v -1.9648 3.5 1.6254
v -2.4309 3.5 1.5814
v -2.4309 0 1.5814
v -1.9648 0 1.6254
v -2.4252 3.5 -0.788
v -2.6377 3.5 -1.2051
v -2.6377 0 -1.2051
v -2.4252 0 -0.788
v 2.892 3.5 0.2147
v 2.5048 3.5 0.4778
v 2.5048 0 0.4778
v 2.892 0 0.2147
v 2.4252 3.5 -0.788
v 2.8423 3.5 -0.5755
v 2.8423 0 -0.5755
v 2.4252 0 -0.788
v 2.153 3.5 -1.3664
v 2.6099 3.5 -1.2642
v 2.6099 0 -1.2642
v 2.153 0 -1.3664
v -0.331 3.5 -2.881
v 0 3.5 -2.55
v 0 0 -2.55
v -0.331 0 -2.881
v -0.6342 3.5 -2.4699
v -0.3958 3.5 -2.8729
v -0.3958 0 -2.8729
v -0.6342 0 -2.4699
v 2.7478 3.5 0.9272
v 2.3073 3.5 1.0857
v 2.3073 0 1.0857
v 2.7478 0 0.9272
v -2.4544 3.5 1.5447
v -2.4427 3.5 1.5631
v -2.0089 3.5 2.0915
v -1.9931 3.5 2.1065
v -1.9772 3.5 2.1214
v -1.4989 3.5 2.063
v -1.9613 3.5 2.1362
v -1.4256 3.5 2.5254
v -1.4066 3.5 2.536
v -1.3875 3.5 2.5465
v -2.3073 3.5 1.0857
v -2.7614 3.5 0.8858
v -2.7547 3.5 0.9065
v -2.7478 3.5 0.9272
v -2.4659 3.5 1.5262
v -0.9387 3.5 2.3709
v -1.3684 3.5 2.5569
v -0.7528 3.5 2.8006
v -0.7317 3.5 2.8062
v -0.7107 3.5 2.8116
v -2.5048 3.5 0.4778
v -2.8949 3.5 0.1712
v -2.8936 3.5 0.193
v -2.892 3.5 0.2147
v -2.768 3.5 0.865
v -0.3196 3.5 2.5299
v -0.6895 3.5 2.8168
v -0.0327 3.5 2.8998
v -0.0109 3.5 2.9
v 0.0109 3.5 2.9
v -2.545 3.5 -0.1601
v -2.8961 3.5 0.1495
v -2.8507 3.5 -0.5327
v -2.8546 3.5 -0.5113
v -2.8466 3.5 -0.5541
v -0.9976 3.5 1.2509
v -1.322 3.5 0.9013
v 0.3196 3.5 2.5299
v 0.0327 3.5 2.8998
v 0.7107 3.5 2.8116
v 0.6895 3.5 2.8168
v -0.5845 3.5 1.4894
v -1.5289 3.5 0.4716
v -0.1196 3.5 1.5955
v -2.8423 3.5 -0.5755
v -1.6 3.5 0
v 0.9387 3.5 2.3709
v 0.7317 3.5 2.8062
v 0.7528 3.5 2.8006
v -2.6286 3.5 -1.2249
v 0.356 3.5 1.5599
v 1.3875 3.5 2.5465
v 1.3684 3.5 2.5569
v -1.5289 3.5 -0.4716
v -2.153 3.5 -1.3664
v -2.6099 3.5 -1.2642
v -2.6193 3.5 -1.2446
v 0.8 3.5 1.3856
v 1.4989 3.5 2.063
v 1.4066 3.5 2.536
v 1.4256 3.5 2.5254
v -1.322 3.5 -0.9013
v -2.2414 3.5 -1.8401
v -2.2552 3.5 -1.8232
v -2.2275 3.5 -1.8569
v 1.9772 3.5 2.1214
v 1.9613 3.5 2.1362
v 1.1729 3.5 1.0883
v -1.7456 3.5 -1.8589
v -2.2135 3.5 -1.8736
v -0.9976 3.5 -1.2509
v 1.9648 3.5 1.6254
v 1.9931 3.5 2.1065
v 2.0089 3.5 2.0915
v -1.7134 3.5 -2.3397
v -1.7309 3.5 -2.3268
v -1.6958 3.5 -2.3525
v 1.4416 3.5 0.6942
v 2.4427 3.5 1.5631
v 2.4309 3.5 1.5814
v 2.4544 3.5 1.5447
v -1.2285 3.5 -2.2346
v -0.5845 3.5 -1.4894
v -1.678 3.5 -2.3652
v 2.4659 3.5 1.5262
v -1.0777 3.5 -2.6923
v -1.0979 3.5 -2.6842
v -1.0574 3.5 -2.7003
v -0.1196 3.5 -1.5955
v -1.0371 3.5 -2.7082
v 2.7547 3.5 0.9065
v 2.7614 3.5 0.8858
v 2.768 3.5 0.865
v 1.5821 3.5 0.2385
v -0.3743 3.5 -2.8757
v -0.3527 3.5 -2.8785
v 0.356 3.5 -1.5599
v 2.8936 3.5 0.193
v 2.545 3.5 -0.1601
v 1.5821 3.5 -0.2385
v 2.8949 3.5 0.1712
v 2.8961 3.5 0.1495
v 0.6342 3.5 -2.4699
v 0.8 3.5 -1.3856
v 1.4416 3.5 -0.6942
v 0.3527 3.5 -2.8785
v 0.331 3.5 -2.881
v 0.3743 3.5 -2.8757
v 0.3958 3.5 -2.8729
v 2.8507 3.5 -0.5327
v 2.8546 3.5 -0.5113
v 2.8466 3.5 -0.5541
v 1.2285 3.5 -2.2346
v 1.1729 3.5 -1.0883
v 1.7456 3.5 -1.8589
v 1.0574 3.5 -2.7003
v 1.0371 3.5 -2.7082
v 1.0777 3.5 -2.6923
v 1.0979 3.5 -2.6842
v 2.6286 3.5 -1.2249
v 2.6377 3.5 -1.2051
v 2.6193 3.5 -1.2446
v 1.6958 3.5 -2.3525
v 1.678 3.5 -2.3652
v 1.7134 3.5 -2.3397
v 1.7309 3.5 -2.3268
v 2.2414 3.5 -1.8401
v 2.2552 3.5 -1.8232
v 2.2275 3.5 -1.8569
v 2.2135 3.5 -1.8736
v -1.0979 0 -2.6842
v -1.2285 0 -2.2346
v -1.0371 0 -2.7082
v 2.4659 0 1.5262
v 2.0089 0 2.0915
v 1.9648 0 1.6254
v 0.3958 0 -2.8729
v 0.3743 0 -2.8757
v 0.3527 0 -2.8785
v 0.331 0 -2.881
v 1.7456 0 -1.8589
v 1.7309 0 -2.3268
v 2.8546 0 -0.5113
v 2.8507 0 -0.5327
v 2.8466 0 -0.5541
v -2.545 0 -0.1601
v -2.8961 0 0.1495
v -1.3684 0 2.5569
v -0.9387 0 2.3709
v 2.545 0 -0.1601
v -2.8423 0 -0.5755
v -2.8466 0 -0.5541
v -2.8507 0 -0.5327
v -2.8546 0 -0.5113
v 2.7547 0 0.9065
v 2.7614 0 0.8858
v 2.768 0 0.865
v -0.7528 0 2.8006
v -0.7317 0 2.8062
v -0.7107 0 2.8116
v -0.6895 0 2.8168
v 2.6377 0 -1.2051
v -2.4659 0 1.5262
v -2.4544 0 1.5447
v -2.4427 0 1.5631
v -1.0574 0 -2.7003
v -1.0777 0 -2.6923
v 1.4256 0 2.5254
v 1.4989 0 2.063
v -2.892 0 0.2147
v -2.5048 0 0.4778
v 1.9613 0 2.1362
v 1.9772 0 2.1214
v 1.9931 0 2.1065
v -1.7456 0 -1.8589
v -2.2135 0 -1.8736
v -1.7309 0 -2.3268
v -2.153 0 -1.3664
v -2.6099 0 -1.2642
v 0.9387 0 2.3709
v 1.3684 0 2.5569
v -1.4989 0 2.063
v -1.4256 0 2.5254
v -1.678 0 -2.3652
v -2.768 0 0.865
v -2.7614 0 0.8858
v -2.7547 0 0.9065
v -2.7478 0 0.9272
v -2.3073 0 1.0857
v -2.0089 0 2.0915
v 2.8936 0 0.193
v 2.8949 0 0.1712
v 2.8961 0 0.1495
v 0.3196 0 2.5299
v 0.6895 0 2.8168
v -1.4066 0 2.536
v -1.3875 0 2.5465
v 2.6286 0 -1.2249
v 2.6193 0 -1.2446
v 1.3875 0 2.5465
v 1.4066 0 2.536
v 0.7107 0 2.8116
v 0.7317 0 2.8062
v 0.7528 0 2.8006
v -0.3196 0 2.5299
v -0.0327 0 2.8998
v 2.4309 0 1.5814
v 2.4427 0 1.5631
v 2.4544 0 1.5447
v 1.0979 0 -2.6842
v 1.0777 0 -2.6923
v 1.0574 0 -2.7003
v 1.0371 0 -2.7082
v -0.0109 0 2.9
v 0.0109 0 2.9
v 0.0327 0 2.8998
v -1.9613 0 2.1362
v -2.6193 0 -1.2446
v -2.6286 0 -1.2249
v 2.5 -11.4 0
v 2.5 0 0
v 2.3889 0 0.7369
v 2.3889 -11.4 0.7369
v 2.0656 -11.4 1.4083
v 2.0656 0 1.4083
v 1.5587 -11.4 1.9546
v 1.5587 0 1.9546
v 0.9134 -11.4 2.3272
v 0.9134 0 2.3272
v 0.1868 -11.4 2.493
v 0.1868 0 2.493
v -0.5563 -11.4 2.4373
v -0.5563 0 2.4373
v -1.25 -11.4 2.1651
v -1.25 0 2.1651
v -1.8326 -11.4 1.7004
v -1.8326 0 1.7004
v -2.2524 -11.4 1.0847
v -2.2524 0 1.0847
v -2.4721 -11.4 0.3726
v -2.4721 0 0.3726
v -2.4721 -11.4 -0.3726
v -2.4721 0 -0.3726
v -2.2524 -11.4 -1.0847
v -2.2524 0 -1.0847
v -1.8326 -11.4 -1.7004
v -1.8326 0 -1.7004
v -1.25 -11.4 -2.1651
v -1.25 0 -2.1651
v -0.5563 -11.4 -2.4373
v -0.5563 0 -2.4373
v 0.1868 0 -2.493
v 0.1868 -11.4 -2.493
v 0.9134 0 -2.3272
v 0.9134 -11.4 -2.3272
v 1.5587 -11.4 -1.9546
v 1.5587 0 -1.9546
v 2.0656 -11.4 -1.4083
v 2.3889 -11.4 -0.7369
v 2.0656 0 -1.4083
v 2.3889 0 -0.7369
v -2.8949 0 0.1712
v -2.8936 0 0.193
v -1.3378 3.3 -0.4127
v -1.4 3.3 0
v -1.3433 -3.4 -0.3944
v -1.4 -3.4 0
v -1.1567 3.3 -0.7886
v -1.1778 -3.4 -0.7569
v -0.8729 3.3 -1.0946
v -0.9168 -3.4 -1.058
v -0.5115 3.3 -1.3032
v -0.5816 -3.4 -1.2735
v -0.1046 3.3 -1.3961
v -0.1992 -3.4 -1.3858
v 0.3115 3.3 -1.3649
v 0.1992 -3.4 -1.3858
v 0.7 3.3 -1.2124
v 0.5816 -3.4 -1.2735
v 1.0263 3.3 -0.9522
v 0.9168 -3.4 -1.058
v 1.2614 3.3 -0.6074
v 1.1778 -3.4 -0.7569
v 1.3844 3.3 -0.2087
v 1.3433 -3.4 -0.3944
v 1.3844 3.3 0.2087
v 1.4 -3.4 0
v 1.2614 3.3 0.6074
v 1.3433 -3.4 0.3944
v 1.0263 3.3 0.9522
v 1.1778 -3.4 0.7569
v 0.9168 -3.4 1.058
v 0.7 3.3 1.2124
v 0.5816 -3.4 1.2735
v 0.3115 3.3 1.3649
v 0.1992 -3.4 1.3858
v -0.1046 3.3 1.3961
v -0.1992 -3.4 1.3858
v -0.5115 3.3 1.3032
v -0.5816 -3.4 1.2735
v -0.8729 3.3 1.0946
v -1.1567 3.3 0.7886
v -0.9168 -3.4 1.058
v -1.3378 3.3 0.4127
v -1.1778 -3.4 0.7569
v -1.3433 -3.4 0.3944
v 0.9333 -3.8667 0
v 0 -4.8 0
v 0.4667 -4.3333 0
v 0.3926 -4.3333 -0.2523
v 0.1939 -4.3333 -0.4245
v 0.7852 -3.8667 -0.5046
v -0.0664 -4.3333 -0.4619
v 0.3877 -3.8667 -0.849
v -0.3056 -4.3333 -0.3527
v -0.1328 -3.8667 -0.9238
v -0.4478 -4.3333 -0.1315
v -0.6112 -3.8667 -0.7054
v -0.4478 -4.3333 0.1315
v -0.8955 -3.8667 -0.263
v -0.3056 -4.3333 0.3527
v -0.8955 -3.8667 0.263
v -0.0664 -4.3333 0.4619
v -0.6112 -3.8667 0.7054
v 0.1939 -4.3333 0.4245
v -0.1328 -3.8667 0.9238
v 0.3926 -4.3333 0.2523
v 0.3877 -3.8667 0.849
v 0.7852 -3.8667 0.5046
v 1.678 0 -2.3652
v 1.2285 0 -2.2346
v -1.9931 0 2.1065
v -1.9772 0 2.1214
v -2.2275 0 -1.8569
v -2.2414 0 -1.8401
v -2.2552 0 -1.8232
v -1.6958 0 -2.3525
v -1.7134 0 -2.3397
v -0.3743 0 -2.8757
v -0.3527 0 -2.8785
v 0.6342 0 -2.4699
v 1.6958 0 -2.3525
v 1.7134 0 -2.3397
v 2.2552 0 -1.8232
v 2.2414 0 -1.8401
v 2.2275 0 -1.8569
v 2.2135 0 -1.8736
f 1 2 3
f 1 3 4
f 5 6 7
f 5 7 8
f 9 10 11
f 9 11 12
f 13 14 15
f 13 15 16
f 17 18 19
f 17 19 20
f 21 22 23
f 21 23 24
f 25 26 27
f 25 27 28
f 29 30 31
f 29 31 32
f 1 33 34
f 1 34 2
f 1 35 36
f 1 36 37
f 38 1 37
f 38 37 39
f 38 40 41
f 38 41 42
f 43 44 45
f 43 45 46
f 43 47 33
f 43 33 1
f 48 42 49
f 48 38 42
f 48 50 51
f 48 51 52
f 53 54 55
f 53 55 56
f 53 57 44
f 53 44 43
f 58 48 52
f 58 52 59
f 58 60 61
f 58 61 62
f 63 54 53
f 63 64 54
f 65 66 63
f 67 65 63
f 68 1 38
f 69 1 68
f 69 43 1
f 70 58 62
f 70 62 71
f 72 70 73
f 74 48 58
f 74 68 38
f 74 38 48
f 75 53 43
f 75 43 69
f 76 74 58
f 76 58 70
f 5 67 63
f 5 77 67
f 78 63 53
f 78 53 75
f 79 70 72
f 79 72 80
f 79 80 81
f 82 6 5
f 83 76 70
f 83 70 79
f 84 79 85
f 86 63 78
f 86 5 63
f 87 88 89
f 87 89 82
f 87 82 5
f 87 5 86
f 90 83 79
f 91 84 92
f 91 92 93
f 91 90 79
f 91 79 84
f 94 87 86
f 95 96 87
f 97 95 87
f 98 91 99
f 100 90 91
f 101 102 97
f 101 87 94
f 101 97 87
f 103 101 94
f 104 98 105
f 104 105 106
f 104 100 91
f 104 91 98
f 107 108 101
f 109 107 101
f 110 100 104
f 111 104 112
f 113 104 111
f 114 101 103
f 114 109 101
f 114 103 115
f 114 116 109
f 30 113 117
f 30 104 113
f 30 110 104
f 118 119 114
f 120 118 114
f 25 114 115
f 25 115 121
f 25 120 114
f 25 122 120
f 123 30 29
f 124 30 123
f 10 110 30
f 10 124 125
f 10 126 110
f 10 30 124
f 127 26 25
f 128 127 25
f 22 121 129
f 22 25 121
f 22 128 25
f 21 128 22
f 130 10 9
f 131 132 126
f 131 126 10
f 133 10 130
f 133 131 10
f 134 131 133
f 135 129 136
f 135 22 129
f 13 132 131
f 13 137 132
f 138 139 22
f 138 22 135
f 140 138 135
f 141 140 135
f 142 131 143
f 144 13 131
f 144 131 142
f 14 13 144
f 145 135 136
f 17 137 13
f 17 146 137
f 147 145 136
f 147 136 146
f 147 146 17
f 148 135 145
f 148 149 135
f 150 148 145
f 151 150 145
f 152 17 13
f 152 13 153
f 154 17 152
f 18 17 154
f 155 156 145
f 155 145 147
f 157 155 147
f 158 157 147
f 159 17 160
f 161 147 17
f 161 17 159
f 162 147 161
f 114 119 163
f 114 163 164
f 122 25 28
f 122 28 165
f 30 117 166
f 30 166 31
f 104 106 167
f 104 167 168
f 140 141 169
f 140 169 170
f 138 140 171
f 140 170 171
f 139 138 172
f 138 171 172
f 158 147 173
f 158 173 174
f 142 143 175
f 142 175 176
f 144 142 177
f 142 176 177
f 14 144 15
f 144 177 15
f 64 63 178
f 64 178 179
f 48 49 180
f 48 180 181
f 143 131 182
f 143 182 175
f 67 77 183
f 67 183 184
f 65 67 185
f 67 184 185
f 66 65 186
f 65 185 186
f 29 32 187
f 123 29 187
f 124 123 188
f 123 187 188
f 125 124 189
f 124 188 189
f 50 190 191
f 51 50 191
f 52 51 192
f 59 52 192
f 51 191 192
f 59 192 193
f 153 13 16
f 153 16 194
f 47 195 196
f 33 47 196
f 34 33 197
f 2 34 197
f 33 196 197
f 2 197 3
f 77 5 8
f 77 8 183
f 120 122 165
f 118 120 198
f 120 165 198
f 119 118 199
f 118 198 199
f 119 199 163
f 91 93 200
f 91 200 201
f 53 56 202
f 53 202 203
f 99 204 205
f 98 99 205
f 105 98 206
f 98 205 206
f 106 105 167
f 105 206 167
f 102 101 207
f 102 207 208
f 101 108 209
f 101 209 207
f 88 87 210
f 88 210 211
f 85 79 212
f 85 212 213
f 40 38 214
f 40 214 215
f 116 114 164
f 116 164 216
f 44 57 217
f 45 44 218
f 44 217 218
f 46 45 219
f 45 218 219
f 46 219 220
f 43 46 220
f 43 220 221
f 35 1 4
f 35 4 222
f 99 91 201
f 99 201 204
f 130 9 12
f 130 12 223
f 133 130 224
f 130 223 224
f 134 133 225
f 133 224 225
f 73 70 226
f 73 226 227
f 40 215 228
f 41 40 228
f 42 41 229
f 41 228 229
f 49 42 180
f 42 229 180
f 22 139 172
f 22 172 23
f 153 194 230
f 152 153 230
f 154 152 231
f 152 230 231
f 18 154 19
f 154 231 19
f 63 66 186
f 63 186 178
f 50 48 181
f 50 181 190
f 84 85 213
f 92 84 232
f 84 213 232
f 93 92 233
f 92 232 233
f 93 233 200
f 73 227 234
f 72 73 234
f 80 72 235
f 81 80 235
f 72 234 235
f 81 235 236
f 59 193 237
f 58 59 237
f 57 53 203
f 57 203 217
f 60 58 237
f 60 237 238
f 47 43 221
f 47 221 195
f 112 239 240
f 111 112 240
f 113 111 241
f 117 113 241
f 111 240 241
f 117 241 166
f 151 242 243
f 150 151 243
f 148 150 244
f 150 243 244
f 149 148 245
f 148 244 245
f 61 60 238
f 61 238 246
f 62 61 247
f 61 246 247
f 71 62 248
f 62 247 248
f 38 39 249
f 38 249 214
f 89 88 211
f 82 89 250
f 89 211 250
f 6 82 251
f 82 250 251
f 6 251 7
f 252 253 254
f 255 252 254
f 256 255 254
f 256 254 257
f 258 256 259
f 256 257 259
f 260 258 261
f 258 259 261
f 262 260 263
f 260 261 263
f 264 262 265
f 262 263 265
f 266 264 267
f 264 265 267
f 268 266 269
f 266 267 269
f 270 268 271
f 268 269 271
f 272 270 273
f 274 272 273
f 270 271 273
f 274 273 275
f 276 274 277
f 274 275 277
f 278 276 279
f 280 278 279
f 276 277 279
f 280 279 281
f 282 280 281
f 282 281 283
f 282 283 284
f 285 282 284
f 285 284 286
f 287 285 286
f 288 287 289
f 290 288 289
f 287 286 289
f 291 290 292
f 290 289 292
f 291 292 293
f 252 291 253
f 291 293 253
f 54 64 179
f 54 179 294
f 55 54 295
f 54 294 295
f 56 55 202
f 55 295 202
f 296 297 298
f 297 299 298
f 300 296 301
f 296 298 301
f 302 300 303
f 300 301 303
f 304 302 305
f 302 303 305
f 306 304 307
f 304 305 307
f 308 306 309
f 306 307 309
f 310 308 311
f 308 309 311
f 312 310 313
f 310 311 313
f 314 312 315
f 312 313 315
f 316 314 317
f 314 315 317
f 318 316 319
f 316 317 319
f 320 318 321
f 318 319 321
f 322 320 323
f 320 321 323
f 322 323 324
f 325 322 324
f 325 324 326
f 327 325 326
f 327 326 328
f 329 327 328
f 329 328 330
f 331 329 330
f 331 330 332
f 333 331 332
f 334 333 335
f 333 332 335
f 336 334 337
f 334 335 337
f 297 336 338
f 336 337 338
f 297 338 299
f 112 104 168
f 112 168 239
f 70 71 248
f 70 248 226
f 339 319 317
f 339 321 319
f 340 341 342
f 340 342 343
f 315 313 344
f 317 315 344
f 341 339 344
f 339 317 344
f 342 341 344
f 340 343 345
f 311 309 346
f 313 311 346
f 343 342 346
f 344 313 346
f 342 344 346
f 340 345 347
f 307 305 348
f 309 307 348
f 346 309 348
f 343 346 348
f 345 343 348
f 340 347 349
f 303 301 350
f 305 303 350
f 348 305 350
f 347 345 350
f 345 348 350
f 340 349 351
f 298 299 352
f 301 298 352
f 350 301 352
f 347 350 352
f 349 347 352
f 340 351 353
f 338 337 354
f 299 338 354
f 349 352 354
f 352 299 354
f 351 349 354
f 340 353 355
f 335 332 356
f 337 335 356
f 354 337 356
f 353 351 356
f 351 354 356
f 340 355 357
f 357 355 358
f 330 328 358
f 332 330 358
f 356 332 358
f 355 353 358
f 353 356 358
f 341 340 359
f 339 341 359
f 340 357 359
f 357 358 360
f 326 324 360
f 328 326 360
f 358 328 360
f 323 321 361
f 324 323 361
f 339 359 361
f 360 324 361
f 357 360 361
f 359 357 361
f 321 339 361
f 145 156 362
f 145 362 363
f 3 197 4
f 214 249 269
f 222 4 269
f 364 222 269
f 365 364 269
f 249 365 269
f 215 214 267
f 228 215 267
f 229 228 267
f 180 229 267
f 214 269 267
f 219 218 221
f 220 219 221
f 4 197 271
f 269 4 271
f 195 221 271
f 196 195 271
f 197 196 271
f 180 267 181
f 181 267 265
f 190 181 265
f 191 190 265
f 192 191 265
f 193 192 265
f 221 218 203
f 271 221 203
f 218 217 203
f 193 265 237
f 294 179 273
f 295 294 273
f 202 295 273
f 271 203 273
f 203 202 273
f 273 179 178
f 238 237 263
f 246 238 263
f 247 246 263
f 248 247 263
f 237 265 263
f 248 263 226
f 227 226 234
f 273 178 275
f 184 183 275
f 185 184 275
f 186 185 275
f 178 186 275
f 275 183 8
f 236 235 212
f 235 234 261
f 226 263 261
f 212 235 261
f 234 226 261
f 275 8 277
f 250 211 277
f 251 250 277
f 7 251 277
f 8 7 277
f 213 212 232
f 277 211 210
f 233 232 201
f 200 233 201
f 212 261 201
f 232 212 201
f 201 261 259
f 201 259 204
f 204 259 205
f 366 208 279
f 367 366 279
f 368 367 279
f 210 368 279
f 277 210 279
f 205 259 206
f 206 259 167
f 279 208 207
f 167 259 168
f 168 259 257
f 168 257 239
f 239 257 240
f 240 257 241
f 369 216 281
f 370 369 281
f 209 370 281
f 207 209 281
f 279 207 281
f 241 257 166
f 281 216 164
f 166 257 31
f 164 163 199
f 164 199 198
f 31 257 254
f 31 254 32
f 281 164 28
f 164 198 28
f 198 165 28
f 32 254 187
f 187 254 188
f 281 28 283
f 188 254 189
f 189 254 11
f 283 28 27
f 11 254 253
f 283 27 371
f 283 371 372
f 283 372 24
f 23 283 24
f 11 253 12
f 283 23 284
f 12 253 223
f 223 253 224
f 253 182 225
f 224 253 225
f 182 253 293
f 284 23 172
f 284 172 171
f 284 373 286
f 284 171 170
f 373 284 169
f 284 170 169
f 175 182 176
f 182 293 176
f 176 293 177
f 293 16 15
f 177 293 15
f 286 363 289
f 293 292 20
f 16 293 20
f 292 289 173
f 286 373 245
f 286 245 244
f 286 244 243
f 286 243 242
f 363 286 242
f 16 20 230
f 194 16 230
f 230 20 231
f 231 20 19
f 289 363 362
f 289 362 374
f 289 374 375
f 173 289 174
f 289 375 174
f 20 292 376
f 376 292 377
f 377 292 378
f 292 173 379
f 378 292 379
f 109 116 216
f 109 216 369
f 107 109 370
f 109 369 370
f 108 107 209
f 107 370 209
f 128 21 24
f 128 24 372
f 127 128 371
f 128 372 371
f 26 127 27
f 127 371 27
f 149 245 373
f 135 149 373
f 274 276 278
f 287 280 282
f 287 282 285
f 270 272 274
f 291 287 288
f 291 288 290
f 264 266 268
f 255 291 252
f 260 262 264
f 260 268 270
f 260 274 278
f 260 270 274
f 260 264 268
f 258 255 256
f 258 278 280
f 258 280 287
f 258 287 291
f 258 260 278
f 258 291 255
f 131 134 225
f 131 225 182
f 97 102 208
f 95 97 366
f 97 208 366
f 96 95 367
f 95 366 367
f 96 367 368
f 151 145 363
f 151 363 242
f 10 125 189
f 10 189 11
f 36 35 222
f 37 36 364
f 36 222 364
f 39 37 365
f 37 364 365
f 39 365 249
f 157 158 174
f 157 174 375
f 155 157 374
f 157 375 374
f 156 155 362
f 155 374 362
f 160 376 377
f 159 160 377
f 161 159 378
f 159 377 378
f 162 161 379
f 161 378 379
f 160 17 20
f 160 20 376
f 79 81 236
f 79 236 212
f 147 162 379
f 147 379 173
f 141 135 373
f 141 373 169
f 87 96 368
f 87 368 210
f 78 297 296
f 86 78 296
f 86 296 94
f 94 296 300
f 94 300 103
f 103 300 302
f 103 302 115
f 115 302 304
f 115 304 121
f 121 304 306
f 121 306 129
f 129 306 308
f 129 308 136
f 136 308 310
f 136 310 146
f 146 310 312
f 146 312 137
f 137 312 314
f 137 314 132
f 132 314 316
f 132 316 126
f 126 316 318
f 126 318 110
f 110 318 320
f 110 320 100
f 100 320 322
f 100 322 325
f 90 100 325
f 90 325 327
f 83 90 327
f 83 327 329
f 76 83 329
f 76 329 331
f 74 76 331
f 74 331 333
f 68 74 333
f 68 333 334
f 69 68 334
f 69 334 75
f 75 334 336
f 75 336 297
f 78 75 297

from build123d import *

# Parameters (mm, degrees)
SKETCH_1_R                  = 2.9
EXTRUDE_1_DEPTH             = 3.5
SKETCH_2_R                  = 2.5
EXTRUDE_2_DEPTH             = 11.4
CUT_EXTRUDE_1_DEPTH         = 4
HOLE_WIZARD_M32_D           = 2.8
HOLE_WIZARD_M32_DEPTH       = 6.9
HOLE_WIZARD_M32_CSINK_D     = 3.2
HOLE_WIZARD_M32_CSINK_ANGLE = 90
HOLE_WIZARD_M32_TIP         = 1.4


with BuildPart() as part:
    # Эскиз1 → Бобышка-Вытянуть1 (new body)
    with BuildSketch(Plane(origin=(0, 0, 0), x_dir=(1, 0, 0), z_dir=(0, 1, 0))):
        Circle(SKETCH_1_R)
    extrude(amount=EXTRUDE_1_DEPTH)

    # Эскиз2 → Бобышка-Вытянуть2 (add)
    with BuildSketch(Plane.XZ):
        Circle(SKETCH_2_R)
    extrude(amount=EXTRUDE_2_DEPTH)

    # Эскиз3 → Вырез-Вытянуть1 (cut)
    with BuildSketch(Plane(origin=(0, 3.5, 0), x_dir=(1, 0, 0), z_dir=(0, 1, 0))):
        Polygon((0, 2.55), (-0.366495157, 2.916495157), (0.366495157, 2.916495157), align=None)
        Polygon((0.634159212, 2.469887061), (0.370321814, 2.916011738), (1.080283889, 2.733724459), align=None)
        Polygon((1.228471869, 2.234582034), (1.083870103, 2.732304577), (1.726194412, 2.3791838), align=None)
        Polygon((1.74559512, 1.85887), (1.729314848, 2.37691667), (2.263641791, 1.875150272), align=None)
        Polygon((2.15303621, 1.366358327), (2.26610038, 1.872178348), (2.658856231, 1.253294157), align=None)
        Polygon((2.425194117, 0.787993336), (2.660498492, 1.249804175), (2.887004956, 0.55268896), align=None)
        Polygon((2.544968157, 0.160115825), (2.887727699, 0.548900209), (2.933752541, -0.182643716), align=None)
        Polygon((2.504832489, -0.477822352), (2.933510354, -0.186493176), (2.796161665, -0.906500217), align=None)
        Polygon((2.307308984, -1.085737193), (2.794969765, -0.910168509), (2.482877668, -1.573397974), align=None)
        Polygon((1.964808769, -1.625431174), (2.480810946, -1.576654607), (2.013585336, -2.141433351), align=None)
        Polygon((1.498852393, -2.062993336), (2.010773652, -2.144073698), (1.417772031, -2.574914594), align=None)
        Polygon((0.938717609, -2.370930039), (1.414392054, -2.576772752), (0.732874896, -2.846604484), align=None)
        Polygon((0.319599746, -2.529892488), (0.729139002, -2.847563698), (0.001928536, -2.939431745), align=None)
        Polygon((-0.319599746, -2.529892488), (-0.001928536, -2.939431745), (-0.729139002, -2.847563698), align=None)
        Polygon((-0.938717609, -2.370930039), (-0.732874896, -2.846604484), (-1.414392054, -2.576772752), align=None)
        Polygon((-1.498852393, -2.062993336), (-1.417772031, -2.574914594), (-2.010773652, -2.144073698), align=None)
        Polygon((-1.964808769, -1.625431174), (-2.013585336, -2.141433351), (-2.480810946, -1.576654607), align=None)
        Polygon((-2.307308984, -1.085737193), (-2.482877668, -1.573397974), (-2.794969765, -0.910168509), align=None)
        Polygon((-2.504832489, -0.477822352), (-2.796161665, -0.906500217), (-2.933510354, -0.186493176), align=None)
        Polygon((-2.544968157, 0.160115825), (-2.933752541, -0.182643716), (-2.887727699, 0.548900209), align=None)
        Polygon((-2.425194117, 0.787993336), (-2.887004956, 0.55268896), (-2.660498492, 1.249804175), align=None)
        Polygon((-2.15303621, 1.366358327), (-2.658856231, 1.253294157), (-2.26610038, 1.872178348), align=None)
        Polygon((-1.74559512, 1.85887), (-2.263641791, 1.875150272), (-1.729314848, 2.37691667), align=None)
        Polygon((-1.228471869, 2.234582034), (-1.726194412, 2.3791838), (-1.083870103, 2.732304577), align=None)
        Polygon((-0.634159212, 2.469887061), (-1.080283889, 2.733724459), (-0.370321814, 2.916011738), align=None)
    extrude(amount=-CUT_EXTRUDE_1_DEPTH, mode=Mode.SUBTRACT)

    # Сверло под метчик  спиральное M32
    with Locations(Plane(origin=(0, 3.5, 0), x_dir=(1, 0, 0), z_dir=(0, 1, 0))):
        with Locations((0, 0)):
            CounterSinkHole(HOLE_WIZARD_M32_D / 2, HOLE_WIZARD_M32_CSINK_D / 2, depth=HOLE_WIZARD_M32_DEPTH, counter_sink_angle=HOLE_WIZARD_M32_CSINK_ANGLE)
            with Locations((0, 0, -(HOLE_WIZARD_M32_DEPTH + HOLE_WIZARD_M32_TIP / 2))):  # 90° drill point
                Cone(0, HOLE_WIZARD_M32_D / 2, HOLE_WIZARD_M32_TIP, mode=Mode.SUBTRACT)


solid = part.part
